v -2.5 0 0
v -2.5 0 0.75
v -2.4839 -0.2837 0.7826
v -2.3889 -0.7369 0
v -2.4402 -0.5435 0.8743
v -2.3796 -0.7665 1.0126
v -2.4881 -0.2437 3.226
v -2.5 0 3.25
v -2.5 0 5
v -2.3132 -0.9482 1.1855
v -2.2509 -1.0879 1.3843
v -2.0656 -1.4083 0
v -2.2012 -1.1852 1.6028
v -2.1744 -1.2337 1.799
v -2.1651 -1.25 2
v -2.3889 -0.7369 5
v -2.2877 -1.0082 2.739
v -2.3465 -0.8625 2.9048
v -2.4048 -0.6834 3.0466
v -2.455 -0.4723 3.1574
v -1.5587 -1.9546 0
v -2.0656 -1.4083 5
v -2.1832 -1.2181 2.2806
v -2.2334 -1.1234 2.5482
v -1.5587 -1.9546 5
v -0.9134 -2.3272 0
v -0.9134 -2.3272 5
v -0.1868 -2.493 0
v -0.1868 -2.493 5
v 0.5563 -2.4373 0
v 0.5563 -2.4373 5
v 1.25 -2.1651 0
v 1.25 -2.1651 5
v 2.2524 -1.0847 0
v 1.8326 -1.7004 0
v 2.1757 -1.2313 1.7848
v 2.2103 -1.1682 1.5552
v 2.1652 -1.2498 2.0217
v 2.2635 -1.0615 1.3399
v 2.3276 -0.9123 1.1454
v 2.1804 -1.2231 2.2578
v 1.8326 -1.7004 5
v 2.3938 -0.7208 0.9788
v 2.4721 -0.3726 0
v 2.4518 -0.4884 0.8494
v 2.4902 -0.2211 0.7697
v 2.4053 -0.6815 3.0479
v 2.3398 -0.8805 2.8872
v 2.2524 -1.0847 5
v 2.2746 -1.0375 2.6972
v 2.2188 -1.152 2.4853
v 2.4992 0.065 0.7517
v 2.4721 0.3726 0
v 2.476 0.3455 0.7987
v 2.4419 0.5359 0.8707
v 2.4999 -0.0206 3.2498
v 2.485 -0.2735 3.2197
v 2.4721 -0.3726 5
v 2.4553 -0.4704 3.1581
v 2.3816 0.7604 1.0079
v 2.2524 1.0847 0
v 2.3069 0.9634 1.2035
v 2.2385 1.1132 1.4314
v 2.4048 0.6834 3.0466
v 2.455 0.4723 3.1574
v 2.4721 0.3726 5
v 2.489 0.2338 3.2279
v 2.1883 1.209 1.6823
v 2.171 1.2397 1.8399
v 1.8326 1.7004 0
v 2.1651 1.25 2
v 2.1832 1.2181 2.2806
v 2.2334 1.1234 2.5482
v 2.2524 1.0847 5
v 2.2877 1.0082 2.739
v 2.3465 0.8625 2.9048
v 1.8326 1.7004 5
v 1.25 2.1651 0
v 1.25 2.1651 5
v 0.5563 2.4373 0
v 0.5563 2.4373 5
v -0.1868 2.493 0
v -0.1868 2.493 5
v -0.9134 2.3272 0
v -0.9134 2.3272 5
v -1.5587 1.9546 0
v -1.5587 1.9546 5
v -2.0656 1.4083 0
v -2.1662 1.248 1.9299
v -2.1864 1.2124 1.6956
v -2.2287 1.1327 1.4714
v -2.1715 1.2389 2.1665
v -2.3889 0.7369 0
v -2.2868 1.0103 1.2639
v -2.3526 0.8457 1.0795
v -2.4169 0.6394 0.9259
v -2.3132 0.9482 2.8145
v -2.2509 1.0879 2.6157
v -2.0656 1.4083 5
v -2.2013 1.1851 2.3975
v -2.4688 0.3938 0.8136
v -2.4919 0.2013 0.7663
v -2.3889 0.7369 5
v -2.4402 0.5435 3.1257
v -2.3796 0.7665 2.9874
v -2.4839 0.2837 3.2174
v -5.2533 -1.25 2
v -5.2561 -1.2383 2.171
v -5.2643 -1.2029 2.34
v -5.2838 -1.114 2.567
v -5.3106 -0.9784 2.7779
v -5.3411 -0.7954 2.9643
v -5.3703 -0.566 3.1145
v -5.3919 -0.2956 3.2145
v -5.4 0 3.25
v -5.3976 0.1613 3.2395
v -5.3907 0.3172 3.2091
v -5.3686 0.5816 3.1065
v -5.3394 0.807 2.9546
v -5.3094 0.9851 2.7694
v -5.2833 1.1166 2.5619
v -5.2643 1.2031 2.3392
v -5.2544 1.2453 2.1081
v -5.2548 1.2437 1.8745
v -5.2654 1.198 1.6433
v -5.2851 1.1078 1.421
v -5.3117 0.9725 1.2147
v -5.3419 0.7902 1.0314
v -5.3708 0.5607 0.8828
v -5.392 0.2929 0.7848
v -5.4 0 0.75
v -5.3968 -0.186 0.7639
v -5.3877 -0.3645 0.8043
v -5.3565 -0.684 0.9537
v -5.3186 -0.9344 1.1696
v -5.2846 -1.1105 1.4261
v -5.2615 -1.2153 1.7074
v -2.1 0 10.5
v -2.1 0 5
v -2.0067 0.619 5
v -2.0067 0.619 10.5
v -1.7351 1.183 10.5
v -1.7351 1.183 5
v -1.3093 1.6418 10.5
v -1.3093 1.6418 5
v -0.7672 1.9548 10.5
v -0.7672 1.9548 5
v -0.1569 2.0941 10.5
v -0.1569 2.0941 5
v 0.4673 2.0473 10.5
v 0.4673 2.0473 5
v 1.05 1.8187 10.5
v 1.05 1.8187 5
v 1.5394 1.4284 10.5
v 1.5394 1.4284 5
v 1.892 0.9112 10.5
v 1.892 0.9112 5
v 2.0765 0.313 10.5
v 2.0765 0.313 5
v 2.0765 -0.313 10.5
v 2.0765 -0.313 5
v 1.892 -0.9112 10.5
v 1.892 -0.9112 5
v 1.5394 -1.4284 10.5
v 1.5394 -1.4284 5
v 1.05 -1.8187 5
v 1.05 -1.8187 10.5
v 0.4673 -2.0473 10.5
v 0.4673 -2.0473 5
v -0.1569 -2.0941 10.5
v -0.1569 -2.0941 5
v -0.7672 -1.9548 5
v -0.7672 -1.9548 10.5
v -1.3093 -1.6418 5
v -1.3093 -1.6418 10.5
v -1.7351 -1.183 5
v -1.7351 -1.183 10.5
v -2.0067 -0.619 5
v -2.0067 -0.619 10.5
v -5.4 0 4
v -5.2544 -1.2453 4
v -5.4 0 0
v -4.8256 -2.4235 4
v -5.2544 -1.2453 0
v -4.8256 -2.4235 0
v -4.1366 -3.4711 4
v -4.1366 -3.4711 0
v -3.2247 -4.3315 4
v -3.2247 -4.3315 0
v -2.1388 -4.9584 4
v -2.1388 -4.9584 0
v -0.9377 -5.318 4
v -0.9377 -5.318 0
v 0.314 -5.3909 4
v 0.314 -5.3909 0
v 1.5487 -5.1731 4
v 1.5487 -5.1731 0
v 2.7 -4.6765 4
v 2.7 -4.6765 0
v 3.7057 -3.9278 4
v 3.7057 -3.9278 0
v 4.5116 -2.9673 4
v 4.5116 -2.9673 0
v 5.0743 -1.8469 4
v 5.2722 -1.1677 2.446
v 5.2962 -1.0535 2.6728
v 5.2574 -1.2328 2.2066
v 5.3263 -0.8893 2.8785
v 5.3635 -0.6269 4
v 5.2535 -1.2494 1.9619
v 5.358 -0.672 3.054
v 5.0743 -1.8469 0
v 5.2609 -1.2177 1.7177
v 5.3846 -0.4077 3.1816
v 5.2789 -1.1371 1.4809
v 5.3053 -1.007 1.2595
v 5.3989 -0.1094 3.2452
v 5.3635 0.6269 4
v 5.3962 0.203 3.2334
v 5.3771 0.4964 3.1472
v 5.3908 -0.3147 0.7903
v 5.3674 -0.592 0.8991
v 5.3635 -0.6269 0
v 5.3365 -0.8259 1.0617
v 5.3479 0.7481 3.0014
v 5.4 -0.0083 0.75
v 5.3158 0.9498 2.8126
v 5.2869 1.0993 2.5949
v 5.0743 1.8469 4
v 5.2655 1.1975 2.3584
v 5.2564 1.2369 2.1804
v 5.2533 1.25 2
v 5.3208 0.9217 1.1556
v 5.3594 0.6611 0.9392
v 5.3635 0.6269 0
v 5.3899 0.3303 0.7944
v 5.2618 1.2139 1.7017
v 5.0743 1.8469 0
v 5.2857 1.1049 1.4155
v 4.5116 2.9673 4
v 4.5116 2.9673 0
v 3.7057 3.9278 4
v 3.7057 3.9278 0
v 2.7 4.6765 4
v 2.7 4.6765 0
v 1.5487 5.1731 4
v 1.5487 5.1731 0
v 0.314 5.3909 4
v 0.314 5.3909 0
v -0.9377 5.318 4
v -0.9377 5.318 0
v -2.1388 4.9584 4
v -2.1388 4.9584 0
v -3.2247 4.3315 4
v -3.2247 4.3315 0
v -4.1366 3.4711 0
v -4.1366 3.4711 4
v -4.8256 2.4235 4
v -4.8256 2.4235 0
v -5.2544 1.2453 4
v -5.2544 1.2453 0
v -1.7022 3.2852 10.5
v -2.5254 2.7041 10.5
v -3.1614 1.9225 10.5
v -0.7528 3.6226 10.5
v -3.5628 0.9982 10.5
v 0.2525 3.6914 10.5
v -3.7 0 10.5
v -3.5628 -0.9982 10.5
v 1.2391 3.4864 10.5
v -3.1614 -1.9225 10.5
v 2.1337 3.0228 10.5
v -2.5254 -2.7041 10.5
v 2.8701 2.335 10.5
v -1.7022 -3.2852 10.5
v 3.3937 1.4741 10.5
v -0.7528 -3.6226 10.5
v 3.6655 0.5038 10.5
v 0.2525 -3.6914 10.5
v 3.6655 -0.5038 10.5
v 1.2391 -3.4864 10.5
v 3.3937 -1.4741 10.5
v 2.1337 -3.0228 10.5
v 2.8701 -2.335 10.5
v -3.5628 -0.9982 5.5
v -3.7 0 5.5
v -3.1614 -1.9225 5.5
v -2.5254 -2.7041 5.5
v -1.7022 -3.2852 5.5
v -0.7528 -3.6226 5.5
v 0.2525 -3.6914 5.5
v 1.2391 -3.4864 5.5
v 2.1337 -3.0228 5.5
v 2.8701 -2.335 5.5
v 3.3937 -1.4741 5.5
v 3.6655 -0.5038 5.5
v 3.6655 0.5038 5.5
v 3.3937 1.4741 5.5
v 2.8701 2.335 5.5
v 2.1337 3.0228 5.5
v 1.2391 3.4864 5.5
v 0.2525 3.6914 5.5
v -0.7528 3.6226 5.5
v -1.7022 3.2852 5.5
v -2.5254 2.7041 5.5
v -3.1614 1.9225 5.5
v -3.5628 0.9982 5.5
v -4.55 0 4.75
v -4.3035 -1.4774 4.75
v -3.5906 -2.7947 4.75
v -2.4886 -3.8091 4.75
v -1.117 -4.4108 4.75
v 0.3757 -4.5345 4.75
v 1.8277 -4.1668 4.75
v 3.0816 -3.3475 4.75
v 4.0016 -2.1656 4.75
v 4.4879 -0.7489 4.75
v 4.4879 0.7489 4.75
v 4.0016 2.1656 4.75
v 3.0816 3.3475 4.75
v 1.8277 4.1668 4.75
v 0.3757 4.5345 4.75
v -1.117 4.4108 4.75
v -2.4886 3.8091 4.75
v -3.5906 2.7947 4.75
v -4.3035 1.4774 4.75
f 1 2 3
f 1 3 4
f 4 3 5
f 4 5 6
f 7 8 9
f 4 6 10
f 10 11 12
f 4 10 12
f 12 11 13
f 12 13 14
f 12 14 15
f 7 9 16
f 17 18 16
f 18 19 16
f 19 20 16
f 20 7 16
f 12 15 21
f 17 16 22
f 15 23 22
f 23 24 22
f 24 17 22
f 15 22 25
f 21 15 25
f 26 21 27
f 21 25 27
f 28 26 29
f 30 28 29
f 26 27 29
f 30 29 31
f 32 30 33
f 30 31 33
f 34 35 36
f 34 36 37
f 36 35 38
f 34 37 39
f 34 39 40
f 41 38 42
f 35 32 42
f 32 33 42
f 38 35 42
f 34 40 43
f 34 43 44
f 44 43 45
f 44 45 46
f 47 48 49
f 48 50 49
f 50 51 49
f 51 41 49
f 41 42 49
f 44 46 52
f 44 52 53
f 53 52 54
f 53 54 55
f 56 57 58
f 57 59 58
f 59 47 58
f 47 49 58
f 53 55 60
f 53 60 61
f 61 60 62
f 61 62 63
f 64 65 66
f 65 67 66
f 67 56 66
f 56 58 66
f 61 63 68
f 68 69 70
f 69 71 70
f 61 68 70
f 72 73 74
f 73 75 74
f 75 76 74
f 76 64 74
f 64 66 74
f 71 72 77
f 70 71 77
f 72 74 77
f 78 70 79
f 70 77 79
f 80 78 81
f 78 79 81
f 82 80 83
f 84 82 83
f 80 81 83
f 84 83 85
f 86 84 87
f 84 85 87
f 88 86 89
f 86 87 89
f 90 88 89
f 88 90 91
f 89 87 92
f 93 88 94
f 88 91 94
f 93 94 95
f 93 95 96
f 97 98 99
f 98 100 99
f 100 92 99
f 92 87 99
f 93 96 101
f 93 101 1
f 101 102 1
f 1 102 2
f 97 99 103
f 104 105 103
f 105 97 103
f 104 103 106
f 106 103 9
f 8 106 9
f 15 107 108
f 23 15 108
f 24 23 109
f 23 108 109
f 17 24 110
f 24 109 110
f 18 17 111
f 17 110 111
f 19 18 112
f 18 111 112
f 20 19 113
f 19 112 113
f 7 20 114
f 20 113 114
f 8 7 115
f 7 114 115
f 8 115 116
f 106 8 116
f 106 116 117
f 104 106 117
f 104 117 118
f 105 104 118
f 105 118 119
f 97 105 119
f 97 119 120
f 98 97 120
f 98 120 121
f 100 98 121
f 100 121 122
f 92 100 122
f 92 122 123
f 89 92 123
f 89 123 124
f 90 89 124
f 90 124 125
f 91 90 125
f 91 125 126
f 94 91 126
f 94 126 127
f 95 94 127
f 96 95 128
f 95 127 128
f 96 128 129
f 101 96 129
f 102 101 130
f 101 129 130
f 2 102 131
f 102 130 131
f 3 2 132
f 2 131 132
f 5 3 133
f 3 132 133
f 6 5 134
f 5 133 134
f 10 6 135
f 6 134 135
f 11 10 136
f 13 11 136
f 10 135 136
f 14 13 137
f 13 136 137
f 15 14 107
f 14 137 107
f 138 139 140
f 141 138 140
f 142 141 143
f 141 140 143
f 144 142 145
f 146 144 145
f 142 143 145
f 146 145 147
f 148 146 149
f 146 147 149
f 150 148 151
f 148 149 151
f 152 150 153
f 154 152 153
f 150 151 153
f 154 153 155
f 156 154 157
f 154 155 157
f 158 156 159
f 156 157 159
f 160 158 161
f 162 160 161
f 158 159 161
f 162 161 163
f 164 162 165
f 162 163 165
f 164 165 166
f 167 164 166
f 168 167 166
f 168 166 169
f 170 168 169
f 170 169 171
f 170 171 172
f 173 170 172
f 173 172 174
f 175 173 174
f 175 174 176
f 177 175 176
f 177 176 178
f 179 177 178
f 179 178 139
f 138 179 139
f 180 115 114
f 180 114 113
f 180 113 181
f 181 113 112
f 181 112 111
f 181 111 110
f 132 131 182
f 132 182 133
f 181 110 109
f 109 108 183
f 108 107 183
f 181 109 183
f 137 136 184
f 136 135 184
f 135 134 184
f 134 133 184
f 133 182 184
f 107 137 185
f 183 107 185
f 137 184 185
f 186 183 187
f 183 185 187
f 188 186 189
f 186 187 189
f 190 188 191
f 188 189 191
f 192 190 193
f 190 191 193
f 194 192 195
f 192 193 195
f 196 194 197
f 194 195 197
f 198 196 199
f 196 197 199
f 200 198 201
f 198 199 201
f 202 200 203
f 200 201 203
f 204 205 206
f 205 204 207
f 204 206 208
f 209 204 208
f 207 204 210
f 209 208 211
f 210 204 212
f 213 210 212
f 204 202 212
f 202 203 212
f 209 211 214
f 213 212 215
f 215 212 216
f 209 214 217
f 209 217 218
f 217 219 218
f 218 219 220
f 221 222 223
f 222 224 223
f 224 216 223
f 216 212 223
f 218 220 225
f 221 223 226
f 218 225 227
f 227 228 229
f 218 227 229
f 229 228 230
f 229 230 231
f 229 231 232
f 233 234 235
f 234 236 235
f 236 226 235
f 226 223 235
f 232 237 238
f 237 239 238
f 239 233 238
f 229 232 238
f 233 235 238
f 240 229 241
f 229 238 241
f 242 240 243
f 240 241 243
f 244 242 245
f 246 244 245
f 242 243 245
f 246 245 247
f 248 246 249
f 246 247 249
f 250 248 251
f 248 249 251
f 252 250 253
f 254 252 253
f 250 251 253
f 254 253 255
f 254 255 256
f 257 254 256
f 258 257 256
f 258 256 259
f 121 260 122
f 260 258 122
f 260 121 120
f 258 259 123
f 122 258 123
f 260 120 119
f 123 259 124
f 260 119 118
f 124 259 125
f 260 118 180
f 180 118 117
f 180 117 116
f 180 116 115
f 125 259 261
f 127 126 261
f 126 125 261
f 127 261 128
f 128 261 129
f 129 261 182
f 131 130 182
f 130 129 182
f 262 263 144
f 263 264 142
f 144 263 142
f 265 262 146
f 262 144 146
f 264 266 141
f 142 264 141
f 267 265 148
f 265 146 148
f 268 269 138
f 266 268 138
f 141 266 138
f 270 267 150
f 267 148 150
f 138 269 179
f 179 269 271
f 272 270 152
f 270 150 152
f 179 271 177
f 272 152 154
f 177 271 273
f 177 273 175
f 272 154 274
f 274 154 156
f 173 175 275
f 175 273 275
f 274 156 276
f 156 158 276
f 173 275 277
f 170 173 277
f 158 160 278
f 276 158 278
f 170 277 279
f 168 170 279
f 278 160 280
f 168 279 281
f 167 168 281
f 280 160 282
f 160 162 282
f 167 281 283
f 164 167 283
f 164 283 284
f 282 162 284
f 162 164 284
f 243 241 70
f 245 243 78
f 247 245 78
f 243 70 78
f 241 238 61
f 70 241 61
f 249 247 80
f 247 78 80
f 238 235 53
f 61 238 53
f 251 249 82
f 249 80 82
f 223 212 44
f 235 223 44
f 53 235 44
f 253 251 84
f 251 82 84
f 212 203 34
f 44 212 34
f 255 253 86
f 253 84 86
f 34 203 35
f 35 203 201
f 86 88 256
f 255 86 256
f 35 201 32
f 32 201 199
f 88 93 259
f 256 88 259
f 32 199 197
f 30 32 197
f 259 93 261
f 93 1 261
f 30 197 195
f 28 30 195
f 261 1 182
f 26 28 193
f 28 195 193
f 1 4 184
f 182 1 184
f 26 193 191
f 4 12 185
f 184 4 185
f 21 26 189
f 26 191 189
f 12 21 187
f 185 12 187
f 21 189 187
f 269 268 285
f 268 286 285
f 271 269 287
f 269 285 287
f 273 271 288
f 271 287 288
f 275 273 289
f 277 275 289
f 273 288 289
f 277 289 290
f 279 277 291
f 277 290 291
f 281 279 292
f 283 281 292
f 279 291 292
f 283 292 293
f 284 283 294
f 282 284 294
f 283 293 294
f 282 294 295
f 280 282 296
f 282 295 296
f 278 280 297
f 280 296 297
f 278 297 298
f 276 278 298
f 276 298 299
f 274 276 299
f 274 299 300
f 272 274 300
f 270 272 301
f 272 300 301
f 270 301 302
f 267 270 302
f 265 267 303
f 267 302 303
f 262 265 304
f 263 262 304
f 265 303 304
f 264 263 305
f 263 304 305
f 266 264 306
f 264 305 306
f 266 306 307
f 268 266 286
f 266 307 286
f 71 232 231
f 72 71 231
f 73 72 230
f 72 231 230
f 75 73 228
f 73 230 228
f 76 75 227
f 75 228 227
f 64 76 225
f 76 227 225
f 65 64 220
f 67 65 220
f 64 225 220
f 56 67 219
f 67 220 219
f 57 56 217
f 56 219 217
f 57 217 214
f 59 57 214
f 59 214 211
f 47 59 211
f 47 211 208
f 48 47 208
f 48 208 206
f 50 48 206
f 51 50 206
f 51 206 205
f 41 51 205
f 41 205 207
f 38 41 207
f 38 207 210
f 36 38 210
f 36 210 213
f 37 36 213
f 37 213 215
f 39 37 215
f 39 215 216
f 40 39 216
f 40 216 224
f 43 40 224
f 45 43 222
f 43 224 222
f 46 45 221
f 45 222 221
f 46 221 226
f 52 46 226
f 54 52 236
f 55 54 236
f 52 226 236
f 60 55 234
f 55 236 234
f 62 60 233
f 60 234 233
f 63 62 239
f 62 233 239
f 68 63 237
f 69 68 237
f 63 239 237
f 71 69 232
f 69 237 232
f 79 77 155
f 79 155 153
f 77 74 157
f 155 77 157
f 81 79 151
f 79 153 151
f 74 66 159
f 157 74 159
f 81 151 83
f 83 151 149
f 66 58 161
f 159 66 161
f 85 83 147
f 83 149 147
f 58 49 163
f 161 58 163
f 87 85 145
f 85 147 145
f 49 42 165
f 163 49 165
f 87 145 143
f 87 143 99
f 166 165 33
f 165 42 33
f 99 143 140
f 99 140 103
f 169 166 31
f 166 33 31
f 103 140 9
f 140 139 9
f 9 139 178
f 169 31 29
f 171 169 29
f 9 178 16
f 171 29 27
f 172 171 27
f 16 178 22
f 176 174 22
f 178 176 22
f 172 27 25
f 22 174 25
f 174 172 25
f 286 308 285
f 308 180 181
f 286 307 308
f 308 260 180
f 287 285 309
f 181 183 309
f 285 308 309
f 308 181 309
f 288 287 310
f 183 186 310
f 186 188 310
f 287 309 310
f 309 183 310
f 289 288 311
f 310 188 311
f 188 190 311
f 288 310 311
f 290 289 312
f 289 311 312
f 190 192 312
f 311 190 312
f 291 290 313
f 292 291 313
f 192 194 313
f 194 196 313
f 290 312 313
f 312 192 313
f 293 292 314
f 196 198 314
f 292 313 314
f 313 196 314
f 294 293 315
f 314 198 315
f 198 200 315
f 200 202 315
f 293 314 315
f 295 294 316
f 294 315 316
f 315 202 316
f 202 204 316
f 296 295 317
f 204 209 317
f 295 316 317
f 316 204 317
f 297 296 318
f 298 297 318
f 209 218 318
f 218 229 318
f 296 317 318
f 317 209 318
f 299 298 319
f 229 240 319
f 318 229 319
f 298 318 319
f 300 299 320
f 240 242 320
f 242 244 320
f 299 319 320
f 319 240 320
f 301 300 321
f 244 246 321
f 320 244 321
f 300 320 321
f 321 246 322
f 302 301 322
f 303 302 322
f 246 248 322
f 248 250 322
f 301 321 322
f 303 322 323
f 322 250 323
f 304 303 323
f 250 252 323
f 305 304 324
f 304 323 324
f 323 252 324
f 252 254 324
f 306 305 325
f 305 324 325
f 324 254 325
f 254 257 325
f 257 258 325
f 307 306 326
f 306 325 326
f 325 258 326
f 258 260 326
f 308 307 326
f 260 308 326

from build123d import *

# Parameters (mm, degrees)
CONNECTOR_M5X0_8_TAPPED_HOLE_D        = 4.2
SET_SCREW_1_M3X0_5_TAPPED_HOLE_REACH  = 16.767
SET_SCREW_1_M3X0_5_TAPPED_HOLE_BORE_R = 1.25
SET_SCREW_2_PATTERN_COUNT             = 2


with BuildPart() as part:
    # Body Sketch → Body Revolve (revolve)
    with BuildSketch(Plane(origin=(0, 0, 0), x_dir=(-1, 0, 0), z_dir=(0, 1, 0))):
        Polygon((1, 10.5), (3.7, 10.5), (3.7, 5.5), (5.4, 4), (5.4, 0), (2.5, 0), (2.5, 5), (1, 5), align=None)
    revolve(axis=Axis((0, 0, 0), (0, 0, 1)))

    # Connector M5x0.8 Tapped Hole (through all)
    with Locations(Plane.XY.offset(10.5)):
        with Locations((0, 0)):
            Hole(CONNECTOR_M5X0_8_TAPPED_HOLE_D / 2)

    # Set Screw 1 M3x0.5 Tapped Hole bore (on position points) → Set Screw 1 M3x0.5 Tapped Hole (cut, up to next)
    with BuildSketch(Plane(origin=(5.4, 0, 2), x_dir=(0, 1, 0), z_dir=(1, 0, 0)), mode=Mode.PRIVATE) as set_screw_1_m3x0_5_tapped_hole_sk1:
        Circle(SET_SCREW_1_M3X0_5_TAPPED_HOLE_BORE_R)
    set_screw_1_m3x0_5_tapped_hole_tool1 = extrude(set_screw_1_m3x0_5_tapped_hole_sk1.sketch, amount=-SET_SCREW_1_M3X0_5_TAPPED_HOLE_REACH, mode=Mode.PRIVATE) & part.part
    set_screw_1_m3x0_5_tapped_hole = set_screw_1_m3x0_5_tapped_hole_tool1.solids().sort_by_distance((5.4, 0, 2))[0]
    add(set_screw_1_m3x0_5_tapped_hole, mode=Mode.SUBTRACT)

    # Set Screw 2 Pattern: Set Screw 1 M3x0.5 Tapped Hole ×2 about axis
    set_screw_2_pattern_axis = Axis((0, 0, 0), (0, 0, 1))
    for i in range(1, SET_SCREW_2_PATTERN_COUNT):
        add(set_screw_1_m3x0_5_tapped_hole.rotate(set_screw_2_pattern_axis, i * 360 / SET_SCREW_2_PATTERN_COUNT), mode=Mode.SUBTRACT)


solid = part.part
